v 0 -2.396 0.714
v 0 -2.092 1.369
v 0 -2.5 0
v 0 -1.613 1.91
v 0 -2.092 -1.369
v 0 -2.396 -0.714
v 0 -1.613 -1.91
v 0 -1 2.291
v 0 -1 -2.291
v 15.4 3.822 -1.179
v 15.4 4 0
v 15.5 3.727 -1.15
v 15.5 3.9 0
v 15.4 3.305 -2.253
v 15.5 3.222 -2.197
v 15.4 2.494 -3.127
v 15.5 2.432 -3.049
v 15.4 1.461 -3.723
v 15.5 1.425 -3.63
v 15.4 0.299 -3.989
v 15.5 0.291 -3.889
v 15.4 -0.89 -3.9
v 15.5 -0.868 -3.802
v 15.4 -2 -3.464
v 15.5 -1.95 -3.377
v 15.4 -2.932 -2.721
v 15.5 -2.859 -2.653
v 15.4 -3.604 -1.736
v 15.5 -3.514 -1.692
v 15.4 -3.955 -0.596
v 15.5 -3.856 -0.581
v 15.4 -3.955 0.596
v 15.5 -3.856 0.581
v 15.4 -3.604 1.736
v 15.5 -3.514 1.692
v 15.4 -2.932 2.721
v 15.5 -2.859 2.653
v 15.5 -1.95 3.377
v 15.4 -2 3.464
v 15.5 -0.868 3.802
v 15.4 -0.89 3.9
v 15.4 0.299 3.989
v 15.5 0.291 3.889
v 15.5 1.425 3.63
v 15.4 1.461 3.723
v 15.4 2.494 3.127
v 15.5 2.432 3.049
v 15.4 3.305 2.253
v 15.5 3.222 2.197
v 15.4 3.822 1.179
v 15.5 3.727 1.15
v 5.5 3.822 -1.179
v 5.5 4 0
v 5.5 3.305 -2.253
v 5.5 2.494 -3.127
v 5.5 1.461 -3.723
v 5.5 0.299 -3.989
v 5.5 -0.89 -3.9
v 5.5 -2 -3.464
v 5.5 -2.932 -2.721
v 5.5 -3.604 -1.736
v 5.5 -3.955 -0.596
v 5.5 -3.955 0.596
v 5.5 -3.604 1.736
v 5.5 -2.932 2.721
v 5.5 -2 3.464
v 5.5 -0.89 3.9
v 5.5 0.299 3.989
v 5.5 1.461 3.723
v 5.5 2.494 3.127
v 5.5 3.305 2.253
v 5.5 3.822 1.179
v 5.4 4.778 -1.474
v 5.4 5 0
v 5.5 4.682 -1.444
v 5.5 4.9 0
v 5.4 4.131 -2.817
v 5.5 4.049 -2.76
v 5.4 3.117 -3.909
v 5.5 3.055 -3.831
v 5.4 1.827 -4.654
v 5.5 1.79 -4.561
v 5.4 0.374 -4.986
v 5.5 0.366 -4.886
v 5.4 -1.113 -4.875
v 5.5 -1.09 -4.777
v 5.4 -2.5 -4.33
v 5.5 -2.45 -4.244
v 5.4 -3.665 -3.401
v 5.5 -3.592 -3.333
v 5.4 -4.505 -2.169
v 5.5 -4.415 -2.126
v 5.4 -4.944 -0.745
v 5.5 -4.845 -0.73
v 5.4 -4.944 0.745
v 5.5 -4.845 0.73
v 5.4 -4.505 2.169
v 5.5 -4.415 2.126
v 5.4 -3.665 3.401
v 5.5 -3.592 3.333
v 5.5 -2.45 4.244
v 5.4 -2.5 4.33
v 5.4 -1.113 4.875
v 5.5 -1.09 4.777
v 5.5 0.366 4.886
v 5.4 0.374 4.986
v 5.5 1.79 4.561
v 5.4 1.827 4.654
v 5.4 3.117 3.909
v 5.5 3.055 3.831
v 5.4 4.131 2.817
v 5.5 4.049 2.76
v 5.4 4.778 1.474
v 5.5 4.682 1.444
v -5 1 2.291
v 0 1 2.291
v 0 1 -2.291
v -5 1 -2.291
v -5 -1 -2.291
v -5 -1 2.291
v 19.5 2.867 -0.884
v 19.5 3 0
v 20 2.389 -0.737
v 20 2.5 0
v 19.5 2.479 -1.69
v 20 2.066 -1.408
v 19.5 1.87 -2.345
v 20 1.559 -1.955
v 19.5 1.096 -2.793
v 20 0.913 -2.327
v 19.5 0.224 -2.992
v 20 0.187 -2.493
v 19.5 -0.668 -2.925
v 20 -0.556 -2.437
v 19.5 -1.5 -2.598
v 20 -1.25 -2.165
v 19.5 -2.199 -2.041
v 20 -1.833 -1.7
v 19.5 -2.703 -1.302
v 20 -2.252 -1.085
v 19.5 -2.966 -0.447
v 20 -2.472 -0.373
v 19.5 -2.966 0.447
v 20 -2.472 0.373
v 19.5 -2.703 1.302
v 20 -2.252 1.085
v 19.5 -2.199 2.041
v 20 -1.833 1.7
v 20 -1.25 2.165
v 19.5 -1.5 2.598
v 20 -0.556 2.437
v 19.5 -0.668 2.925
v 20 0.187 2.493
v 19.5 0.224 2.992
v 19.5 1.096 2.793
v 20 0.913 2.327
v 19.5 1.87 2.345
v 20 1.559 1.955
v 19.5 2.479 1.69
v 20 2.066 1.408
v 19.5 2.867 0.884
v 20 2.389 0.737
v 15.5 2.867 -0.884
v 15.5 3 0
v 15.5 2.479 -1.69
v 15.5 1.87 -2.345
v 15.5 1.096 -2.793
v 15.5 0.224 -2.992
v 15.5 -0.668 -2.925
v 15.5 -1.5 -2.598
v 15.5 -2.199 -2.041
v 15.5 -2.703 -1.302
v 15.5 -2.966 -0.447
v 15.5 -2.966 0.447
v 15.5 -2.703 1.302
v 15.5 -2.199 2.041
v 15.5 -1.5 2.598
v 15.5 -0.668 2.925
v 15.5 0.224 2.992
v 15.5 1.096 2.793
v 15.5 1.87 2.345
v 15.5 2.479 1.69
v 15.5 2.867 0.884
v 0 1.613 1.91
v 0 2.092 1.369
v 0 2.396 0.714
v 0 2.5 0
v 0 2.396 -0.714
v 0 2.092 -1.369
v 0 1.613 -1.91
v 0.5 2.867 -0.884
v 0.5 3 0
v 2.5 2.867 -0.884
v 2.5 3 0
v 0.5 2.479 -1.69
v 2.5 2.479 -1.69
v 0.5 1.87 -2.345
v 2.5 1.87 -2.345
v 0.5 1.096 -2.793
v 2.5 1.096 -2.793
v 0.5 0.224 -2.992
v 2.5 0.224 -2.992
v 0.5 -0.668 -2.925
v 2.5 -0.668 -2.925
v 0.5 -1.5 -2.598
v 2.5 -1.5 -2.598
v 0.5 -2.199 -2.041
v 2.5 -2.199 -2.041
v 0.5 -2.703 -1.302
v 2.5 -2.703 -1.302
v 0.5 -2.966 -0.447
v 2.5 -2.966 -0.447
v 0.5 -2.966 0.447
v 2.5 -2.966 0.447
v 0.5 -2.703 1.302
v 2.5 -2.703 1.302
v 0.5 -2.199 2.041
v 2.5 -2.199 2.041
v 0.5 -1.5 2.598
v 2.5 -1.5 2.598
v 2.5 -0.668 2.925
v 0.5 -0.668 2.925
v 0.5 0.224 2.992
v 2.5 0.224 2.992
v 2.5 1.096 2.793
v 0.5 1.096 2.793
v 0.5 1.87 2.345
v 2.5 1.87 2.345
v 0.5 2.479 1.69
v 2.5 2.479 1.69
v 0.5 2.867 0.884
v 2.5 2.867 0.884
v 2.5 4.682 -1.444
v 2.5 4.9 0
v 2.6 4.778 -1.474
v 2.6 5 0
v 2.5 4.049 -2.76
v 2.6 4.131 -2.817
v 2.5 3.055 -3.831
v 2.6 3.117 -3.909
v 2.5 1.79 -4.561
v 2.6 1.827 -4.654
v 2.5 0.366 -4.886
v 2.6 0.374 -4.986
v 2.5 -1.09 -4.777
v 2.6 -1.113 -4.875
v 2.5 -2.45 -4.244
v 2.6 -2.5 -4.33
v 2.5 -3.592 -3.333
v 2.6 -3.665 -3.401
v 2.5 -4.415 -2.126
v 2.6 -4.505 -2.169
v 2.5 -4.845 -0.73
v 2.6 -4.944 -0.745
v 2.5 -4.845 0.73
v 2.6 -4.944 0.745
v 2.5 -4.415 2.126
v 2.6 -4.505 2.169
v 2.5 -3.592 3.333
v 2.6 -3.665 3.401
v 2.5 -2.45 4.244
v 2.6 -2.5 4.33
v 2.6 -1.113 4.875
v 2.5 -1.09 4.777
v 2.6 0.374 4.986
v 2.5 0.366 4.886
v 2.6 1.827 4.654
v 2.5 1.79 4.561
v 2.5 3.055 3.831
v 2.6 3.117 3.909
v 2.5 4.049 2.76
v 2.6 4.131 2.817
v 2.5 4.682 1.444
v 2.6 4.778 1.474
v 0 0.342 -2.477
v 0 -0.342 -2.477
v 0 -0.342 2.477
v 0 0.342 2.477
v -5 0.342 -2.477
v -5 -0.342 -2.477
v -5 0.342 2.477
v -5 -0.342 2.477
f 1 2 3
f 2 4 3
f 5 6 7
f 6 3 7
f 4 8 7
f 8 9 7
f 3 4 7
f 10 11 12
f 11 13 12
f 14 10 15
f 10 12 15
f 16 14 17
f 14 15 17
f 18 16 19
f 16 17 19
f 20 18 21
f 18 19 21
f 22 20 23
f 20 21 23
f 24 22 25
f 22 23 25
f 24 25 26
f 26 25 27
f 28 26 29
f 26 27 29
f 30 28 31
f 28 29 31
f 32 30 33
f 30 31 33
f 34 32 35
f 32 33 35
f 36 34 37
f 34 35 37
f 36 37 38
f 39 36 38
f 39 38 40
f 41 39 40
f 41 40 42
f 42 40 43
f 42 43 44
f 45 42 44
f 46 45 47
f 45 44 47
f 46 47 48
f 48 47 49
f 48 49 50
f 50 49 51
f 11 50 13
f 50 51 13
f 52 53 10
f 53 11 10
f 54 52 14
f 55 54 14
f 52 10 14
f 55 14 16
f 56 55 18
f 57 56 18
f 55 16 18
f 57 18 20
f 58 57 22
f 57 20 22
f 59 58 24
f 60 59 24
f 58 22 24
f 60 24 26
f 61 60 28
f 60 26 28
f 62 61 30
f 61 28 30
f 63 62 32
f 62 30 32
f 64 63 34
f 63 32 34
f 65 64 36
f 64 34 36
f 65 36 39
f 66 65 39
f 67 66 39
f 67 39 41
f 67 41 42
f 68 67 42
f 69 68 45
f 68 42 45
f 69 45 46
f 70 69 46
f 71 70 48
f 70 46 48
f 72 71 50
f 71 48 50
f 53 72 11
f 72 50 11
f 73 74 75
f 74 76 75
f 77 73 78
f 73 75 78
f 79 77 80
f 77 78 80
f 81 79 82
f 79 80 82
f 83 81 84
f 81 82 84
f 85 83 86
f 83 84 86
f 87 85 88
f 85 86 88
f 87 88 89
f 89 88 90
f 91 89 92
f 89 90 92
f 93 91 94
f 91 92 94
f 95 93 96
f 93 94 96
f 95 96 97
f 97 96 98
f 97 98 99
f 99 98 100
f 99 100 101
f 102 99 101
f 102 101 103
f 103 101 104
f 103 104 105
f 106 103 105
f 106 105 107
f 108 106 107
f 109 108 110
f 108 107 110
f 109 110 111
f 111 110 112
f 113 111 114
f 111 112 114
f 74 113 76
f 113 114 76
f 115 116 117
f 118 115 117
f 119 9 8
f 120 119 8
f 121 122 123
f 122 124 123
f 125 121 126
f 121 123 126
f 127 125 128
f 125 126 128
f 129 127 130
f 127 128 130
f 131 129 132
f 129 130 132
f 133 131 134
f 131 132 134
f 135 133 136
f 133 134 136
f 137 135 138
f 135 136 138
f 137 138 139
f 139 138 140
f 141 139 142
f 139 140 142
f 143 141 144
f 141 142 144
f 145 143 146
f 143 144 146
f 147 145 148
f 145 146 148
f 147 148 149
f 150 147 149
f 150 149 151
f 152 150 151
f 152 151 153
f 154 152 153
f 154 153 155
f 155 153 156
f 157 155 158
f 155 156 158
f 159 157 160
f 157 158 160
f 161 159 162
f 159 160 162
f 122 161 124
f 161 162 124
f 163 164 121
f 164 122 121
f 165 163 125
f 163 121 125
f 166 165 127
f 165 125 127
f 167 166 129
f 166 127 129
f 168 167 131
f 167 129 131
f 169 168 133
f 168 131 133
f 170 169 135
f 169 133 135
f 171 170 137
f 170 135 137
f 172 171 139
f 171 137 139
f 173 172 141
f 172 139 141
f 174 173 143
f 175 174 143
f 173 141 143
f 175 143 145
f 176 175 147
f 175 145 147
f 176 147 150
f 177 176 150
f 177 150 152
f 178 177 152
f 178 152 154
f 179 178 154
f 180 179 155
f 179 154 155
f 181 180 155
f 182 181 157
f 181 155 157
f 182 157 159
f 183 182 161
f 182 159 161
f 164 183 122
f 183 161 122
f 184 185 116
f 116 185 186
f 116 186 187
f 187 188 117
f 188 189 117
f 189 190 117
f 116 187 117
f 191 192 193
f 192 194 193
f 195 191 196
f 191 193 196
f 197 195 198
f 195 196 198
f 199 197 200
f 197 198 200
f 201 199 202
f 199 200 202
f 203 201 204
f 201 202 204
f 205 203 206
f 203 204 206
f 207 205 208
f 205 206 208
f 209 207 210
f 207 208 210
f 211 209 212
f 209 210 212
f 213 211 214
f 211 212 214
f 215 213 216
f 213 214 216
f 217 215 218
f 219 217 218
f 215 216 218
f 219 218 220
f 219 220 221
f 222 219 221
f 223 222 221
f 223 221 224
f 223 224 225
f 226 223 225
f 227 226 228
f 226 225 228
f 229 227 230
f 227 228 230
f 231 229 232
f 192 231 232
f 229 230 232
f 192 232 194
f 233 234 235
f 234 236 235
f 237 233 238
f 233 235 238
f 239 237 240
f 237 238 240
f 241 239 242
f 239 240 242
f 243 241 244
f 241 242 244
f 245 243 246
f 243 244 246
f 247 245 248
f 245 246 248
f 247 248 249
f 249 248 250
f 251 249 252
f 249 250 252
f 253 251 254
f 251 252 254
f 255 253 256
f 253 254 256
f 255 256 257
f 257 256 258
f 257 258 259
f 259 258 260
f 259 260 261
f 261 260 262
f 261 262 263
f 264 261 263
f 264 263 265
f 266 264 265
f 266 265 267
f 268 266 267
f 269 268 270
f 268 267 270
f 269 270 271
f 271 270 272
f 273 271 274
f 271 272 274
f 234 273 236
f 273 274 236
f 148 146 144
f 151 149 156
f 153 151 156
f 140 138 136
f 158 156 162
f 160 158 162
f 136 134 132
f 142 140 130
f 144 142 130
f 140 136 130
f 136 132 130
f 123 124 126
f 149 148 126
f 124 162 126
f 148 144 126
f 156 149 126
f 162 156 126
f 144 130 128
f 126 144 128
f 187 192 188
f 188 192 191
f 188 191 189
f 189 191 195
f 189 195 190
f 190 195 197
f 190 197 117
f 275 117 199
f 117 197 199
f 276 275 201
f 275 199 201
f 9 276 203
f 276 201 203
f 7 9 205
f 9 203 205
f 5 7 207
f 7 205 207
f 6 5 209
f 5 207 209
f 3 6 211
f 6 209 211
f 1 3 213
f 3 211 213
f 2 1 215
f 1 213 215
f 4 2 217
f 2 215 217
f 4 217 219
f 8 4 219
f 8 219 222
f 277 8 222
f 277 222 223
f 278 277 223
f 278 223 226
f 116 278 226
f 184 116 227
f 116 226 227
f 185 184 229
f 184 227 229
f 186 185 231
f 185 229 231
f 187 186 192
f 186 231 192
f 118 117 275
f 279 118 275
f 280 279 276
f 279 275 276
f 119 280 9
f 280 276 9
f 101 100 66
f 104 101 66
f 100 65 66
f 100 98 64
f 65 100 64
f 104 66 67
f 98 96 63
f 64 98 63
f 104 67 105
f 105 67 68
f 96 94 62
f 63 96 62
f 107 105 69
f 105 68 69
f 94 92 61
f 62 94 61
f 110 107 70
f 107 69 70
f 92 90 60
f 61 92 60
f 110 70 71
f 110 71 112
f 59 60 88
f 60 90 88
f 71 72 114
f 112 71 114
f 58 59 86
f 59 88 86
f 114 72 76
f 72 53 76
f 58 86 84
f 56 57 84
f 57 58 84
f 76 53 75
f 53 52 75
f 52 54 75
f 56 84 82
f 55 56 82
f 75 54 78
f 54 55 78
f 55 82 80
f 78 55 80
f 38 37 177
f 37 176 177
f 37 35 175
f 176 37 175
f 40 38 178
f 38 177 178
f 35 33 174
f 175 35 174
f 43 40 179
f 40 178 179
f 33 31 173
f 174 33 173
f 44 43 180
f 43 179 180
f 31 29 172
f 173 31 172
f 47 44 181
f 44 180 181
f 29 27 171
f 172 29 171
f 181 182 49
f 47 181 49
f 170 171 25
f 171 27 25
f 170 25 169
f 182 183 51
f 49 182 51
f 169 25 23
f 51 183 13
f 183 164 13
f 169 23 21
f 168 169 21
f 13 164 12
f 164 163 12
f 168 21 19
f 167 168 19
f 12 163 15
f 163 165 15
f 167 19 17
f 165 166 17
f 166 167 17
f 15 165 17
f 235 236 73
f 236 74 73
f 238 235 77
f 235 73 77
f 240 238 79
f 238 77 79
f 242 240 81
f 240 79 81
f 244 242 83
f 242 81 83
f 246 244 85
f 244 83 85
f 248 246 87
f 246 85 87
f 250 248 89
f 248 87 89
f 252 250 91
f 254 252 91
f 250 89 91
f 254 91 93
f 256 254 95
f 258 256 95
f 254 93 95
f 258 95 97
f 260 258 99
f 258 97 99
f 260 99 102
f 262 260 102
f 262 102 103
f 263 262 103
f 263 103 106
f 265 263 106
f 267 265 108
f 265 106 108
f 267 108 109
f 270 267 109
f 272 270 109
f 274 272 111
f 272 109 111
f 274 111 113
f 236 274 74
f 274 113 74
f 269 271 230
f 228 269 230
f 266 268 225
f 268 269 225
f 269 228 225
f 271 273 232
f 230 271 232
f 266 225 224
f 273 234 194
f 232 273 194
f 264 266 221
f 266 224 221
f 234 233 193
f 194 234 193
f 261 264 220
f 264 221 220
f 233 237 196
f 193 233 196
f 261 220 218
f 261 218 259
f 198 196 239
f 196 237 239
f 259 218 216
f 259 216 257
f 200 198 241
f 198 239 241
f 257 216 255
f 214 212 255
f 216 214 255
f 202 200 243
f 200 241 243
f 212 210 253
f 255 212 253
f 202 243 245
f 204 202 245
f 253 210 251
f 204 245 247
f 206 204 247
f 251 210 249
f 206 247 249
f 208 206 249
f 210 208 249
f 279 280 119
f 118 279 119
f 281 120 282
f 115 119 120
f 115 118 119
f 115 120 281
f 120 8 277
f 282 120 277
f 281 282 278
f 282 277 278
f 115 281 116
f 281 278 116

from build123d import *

# Parameters (mm, degrees)
EXTRUDE_3_DEPTH = 5


with BuildPart() as part:
    # 草图1 → 旋转1 (revolve)
    with BuildSketch(Plane.XY):
        Polygon((0, 0), (0, 2.5), (0.5, 3), (2.5, 3), (2.5, 4.9), (2.6, 5), (5.4, 5), (5.5, 4.9), (5.5, 4), (15.4, 4), (15.5, 3.9), (15.5, 3), (19.5, 3), (20, 2.5), (20, 0), align=None)
    revolve(axis=Axis((20, 0, 0), (-1, 0, 0)))

    # 草图4 → 凸台-拉伸3 (add)
    with BuildSketch(Plane(origin=(0, 0, 0), x_dir=(0, 0, -1), z_dir=(1, 0, 0))):
        with BuildLine():
            Line((0, 1), (2.291287847, 1))
            ThreePointArc((2.291287847, 1), (2.5, 0), (2.291287847, -1))
            Line((2.291287847, -1), (0, -1))
            Line((0, -1), (-2.291287847, -1))
            ThreePointArc((-2.291287847, -1), (-2.5, 0), (-2.291287847, 1))
            Line((-2.291287847, 1), (0, 1))
        make_face()
    extrude(amount=-EXTRUDE_3_DEPTH)


solid = part.part
